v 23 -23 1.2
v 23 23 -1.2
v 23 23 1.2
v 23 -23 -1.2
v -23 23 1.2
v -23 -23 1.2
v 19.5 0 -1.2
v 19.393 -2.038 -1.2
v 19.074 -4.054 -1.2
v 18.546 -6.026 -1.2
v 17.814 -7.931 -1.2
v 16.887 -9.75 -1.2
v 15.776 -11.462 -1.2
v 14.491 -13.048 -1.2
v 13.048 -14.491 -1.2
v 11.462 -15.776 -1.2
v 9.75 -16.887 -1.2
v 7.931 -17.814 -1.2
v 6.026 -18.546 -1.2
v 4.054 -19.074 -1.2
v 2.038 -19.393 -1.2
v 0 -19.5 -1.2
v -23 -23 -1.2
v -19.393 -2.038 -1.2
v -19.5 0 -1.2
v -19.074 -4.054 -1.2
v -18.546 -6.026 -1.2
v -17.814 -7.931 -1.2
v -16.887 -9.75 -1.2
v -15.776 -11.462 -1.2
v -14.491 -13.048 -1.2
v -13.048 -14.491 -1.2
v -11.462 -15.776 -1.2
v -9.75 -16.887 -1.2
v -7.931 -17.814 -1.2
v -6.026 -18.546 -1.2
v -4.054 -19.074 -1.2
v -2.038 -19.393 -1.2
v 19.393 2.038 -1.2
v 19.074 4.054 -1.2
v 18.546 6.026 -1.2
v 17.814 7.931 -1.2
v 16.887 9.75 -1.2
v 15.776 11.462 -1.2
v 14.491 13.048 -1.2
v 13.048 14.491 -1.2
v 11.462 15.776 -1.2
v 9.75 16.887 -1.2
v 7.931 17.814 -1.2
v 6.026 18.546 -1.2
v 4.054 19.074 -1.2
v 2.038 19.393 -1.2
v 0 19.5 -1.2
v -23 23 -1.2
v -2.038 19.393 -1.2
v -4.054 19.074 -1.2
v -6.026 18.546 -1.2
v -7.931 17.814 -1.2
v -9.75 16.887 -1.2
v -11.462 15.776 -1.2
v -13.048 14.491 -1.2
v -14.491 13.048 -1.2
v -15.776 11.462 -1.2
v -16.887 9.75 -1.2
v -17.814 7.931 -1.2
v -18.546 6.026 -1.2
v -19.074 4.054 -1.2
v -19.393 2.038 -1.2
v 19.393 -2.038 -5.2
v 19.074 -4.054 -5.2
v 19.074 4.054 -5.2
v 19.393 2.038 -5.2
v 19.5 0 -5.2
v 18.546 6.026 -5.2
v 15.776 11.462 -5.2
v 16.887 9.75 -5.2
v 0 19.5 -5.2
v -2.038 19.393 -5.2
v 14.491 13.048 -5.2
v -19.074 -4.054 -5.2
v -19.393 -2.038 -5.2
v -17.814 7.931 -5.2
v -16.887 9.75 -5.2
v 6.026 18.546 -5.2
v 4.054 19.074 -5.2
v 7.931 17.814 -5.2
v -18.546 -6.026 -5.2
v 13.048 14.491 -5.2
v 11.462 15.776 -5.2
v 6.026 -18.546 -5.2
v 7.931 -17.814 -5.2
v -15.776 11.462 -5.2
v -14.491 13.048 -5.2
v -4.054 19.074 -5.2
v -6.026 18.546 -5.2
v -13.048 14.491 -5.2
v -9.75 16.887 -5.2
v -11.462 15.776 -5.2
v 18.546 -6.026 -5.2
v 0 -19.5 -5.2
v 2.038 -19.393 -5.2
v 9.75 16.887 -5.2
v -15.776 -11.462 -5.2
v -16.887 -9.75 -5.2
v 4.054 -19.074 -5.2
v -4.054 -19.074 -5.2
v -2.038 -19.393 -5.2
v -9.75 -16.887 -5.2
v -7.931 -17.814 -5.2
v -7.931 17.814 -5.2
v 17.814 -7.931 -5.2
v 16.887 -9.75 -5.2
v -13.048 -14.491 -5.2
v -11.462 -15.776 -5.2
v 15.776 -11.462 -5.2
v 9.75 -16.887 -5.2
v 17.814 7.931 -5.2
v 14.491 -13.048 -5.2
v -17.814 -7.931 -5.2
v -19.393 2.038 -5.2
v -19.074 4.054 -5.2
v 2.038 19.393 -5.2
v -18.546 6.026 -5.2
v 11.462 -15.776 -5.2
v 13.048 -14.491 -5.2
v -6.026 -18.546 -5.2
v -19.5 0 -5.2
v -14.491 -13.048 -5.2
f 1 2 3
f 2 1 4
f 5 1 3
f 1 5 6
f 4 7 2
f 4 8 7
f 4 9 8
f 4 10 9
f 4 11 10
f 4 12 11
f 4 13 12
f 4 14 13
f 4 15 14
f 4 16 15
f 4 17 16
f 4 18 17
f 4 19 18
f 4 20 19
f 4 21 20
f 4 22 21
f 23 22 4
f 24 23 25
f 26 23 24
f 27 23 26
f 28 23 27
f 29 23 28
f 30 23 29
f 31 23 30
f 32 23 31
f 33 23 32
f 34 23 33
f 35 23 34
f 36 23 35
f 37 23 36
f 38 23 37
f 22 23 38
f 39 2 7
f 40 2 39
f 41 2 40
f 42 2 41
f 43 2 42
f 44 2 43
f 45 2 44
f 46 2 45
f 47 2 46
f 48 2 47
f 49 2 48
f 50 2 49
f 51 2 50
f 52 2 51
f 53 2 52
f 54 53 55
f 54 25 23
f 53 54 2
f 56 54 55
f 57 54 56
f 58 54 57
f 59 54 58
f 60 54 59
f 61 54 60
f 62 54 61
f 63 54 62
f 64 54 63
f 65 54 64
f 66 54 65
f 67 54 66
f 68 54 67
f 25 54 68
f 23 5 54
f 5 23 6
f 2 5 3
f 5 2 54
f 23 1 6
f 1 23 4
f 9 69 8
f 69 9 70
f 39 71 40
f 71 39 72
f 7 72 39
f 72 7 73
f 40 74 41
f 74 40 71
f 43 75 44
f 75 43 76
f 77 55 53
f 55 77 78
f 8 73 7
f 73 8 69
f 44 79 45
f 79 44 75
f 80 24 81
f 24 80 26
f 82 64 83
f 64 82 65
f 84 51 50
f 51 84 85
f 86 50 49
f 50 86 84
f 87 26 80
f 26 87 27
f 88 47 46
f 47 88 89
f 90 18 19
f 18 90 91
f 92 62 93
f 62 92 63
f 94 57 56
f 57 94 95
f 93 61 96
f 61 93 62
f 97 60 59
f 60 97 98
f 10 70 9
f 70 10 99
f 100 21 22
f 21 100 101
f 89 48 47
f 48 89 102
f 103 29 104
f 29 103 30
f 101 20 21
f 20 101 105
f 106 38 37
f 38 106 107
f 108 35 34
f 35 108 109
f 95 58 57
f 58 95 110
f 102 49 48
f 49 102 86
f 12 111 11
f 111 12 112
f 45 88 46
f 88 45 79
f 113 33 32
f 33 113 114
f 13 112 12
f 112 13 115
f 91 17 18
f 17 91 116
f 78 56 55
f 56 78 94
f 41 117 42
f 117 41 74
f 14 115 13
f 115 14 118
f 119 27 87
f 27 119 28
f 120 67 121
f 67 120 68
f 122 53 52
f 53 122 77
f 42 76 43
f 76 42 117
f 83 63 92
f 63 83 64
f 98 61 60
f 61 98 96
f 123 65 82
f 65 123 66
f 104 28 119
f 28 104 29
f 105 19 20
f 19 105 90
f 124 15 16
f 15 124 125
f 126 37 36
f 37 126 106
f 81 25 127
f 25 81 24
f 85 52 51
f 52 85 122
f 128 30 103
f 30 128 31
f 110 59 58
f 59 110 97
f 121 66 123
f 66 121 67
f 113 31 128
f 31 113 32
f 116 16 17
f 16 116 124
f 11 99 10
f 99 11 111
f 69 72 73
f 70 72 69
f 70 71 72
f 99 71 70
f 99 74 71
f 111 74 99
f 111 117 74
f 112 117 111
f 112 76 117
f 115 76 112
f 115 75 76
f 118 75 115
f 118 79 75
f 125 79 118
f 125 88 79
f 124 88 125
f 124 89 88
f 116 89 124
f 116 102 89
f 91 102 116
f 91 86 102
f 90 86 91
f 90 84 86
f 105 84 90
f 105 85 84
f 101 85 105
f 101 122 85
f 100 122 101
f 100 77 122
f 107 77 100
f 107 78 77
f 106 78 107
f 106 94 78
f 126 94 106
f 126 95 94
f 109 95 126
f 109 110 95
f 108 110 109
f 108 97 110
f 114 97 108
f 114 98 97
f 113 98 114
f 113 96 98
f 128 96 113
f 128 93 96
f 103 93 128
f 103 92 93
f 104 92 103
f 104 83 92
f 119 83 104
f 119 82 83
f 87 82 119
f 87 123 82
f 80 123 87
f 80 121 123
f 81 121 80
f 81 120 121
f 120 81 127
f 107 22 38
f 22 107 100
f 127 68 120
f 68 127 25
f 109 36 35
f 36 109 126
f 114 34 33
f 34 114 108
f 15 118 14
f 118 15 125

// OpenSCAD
// Press-fit end cap for 45 mm extrusion.
$fn = 60;
eps = 0.02;
profile = 45;
cap_t = 2.4;
wall = 3;
pin_d = profile - 2 * wall;
pin_l = 4;
union() {
    cube([profile + 1, profile + 1, cap_t], center = true);
    translate([0, 0, -cap_t / 2 - pin_l]) cylinder(d = pin_d, h = pin_l + eps);
}
